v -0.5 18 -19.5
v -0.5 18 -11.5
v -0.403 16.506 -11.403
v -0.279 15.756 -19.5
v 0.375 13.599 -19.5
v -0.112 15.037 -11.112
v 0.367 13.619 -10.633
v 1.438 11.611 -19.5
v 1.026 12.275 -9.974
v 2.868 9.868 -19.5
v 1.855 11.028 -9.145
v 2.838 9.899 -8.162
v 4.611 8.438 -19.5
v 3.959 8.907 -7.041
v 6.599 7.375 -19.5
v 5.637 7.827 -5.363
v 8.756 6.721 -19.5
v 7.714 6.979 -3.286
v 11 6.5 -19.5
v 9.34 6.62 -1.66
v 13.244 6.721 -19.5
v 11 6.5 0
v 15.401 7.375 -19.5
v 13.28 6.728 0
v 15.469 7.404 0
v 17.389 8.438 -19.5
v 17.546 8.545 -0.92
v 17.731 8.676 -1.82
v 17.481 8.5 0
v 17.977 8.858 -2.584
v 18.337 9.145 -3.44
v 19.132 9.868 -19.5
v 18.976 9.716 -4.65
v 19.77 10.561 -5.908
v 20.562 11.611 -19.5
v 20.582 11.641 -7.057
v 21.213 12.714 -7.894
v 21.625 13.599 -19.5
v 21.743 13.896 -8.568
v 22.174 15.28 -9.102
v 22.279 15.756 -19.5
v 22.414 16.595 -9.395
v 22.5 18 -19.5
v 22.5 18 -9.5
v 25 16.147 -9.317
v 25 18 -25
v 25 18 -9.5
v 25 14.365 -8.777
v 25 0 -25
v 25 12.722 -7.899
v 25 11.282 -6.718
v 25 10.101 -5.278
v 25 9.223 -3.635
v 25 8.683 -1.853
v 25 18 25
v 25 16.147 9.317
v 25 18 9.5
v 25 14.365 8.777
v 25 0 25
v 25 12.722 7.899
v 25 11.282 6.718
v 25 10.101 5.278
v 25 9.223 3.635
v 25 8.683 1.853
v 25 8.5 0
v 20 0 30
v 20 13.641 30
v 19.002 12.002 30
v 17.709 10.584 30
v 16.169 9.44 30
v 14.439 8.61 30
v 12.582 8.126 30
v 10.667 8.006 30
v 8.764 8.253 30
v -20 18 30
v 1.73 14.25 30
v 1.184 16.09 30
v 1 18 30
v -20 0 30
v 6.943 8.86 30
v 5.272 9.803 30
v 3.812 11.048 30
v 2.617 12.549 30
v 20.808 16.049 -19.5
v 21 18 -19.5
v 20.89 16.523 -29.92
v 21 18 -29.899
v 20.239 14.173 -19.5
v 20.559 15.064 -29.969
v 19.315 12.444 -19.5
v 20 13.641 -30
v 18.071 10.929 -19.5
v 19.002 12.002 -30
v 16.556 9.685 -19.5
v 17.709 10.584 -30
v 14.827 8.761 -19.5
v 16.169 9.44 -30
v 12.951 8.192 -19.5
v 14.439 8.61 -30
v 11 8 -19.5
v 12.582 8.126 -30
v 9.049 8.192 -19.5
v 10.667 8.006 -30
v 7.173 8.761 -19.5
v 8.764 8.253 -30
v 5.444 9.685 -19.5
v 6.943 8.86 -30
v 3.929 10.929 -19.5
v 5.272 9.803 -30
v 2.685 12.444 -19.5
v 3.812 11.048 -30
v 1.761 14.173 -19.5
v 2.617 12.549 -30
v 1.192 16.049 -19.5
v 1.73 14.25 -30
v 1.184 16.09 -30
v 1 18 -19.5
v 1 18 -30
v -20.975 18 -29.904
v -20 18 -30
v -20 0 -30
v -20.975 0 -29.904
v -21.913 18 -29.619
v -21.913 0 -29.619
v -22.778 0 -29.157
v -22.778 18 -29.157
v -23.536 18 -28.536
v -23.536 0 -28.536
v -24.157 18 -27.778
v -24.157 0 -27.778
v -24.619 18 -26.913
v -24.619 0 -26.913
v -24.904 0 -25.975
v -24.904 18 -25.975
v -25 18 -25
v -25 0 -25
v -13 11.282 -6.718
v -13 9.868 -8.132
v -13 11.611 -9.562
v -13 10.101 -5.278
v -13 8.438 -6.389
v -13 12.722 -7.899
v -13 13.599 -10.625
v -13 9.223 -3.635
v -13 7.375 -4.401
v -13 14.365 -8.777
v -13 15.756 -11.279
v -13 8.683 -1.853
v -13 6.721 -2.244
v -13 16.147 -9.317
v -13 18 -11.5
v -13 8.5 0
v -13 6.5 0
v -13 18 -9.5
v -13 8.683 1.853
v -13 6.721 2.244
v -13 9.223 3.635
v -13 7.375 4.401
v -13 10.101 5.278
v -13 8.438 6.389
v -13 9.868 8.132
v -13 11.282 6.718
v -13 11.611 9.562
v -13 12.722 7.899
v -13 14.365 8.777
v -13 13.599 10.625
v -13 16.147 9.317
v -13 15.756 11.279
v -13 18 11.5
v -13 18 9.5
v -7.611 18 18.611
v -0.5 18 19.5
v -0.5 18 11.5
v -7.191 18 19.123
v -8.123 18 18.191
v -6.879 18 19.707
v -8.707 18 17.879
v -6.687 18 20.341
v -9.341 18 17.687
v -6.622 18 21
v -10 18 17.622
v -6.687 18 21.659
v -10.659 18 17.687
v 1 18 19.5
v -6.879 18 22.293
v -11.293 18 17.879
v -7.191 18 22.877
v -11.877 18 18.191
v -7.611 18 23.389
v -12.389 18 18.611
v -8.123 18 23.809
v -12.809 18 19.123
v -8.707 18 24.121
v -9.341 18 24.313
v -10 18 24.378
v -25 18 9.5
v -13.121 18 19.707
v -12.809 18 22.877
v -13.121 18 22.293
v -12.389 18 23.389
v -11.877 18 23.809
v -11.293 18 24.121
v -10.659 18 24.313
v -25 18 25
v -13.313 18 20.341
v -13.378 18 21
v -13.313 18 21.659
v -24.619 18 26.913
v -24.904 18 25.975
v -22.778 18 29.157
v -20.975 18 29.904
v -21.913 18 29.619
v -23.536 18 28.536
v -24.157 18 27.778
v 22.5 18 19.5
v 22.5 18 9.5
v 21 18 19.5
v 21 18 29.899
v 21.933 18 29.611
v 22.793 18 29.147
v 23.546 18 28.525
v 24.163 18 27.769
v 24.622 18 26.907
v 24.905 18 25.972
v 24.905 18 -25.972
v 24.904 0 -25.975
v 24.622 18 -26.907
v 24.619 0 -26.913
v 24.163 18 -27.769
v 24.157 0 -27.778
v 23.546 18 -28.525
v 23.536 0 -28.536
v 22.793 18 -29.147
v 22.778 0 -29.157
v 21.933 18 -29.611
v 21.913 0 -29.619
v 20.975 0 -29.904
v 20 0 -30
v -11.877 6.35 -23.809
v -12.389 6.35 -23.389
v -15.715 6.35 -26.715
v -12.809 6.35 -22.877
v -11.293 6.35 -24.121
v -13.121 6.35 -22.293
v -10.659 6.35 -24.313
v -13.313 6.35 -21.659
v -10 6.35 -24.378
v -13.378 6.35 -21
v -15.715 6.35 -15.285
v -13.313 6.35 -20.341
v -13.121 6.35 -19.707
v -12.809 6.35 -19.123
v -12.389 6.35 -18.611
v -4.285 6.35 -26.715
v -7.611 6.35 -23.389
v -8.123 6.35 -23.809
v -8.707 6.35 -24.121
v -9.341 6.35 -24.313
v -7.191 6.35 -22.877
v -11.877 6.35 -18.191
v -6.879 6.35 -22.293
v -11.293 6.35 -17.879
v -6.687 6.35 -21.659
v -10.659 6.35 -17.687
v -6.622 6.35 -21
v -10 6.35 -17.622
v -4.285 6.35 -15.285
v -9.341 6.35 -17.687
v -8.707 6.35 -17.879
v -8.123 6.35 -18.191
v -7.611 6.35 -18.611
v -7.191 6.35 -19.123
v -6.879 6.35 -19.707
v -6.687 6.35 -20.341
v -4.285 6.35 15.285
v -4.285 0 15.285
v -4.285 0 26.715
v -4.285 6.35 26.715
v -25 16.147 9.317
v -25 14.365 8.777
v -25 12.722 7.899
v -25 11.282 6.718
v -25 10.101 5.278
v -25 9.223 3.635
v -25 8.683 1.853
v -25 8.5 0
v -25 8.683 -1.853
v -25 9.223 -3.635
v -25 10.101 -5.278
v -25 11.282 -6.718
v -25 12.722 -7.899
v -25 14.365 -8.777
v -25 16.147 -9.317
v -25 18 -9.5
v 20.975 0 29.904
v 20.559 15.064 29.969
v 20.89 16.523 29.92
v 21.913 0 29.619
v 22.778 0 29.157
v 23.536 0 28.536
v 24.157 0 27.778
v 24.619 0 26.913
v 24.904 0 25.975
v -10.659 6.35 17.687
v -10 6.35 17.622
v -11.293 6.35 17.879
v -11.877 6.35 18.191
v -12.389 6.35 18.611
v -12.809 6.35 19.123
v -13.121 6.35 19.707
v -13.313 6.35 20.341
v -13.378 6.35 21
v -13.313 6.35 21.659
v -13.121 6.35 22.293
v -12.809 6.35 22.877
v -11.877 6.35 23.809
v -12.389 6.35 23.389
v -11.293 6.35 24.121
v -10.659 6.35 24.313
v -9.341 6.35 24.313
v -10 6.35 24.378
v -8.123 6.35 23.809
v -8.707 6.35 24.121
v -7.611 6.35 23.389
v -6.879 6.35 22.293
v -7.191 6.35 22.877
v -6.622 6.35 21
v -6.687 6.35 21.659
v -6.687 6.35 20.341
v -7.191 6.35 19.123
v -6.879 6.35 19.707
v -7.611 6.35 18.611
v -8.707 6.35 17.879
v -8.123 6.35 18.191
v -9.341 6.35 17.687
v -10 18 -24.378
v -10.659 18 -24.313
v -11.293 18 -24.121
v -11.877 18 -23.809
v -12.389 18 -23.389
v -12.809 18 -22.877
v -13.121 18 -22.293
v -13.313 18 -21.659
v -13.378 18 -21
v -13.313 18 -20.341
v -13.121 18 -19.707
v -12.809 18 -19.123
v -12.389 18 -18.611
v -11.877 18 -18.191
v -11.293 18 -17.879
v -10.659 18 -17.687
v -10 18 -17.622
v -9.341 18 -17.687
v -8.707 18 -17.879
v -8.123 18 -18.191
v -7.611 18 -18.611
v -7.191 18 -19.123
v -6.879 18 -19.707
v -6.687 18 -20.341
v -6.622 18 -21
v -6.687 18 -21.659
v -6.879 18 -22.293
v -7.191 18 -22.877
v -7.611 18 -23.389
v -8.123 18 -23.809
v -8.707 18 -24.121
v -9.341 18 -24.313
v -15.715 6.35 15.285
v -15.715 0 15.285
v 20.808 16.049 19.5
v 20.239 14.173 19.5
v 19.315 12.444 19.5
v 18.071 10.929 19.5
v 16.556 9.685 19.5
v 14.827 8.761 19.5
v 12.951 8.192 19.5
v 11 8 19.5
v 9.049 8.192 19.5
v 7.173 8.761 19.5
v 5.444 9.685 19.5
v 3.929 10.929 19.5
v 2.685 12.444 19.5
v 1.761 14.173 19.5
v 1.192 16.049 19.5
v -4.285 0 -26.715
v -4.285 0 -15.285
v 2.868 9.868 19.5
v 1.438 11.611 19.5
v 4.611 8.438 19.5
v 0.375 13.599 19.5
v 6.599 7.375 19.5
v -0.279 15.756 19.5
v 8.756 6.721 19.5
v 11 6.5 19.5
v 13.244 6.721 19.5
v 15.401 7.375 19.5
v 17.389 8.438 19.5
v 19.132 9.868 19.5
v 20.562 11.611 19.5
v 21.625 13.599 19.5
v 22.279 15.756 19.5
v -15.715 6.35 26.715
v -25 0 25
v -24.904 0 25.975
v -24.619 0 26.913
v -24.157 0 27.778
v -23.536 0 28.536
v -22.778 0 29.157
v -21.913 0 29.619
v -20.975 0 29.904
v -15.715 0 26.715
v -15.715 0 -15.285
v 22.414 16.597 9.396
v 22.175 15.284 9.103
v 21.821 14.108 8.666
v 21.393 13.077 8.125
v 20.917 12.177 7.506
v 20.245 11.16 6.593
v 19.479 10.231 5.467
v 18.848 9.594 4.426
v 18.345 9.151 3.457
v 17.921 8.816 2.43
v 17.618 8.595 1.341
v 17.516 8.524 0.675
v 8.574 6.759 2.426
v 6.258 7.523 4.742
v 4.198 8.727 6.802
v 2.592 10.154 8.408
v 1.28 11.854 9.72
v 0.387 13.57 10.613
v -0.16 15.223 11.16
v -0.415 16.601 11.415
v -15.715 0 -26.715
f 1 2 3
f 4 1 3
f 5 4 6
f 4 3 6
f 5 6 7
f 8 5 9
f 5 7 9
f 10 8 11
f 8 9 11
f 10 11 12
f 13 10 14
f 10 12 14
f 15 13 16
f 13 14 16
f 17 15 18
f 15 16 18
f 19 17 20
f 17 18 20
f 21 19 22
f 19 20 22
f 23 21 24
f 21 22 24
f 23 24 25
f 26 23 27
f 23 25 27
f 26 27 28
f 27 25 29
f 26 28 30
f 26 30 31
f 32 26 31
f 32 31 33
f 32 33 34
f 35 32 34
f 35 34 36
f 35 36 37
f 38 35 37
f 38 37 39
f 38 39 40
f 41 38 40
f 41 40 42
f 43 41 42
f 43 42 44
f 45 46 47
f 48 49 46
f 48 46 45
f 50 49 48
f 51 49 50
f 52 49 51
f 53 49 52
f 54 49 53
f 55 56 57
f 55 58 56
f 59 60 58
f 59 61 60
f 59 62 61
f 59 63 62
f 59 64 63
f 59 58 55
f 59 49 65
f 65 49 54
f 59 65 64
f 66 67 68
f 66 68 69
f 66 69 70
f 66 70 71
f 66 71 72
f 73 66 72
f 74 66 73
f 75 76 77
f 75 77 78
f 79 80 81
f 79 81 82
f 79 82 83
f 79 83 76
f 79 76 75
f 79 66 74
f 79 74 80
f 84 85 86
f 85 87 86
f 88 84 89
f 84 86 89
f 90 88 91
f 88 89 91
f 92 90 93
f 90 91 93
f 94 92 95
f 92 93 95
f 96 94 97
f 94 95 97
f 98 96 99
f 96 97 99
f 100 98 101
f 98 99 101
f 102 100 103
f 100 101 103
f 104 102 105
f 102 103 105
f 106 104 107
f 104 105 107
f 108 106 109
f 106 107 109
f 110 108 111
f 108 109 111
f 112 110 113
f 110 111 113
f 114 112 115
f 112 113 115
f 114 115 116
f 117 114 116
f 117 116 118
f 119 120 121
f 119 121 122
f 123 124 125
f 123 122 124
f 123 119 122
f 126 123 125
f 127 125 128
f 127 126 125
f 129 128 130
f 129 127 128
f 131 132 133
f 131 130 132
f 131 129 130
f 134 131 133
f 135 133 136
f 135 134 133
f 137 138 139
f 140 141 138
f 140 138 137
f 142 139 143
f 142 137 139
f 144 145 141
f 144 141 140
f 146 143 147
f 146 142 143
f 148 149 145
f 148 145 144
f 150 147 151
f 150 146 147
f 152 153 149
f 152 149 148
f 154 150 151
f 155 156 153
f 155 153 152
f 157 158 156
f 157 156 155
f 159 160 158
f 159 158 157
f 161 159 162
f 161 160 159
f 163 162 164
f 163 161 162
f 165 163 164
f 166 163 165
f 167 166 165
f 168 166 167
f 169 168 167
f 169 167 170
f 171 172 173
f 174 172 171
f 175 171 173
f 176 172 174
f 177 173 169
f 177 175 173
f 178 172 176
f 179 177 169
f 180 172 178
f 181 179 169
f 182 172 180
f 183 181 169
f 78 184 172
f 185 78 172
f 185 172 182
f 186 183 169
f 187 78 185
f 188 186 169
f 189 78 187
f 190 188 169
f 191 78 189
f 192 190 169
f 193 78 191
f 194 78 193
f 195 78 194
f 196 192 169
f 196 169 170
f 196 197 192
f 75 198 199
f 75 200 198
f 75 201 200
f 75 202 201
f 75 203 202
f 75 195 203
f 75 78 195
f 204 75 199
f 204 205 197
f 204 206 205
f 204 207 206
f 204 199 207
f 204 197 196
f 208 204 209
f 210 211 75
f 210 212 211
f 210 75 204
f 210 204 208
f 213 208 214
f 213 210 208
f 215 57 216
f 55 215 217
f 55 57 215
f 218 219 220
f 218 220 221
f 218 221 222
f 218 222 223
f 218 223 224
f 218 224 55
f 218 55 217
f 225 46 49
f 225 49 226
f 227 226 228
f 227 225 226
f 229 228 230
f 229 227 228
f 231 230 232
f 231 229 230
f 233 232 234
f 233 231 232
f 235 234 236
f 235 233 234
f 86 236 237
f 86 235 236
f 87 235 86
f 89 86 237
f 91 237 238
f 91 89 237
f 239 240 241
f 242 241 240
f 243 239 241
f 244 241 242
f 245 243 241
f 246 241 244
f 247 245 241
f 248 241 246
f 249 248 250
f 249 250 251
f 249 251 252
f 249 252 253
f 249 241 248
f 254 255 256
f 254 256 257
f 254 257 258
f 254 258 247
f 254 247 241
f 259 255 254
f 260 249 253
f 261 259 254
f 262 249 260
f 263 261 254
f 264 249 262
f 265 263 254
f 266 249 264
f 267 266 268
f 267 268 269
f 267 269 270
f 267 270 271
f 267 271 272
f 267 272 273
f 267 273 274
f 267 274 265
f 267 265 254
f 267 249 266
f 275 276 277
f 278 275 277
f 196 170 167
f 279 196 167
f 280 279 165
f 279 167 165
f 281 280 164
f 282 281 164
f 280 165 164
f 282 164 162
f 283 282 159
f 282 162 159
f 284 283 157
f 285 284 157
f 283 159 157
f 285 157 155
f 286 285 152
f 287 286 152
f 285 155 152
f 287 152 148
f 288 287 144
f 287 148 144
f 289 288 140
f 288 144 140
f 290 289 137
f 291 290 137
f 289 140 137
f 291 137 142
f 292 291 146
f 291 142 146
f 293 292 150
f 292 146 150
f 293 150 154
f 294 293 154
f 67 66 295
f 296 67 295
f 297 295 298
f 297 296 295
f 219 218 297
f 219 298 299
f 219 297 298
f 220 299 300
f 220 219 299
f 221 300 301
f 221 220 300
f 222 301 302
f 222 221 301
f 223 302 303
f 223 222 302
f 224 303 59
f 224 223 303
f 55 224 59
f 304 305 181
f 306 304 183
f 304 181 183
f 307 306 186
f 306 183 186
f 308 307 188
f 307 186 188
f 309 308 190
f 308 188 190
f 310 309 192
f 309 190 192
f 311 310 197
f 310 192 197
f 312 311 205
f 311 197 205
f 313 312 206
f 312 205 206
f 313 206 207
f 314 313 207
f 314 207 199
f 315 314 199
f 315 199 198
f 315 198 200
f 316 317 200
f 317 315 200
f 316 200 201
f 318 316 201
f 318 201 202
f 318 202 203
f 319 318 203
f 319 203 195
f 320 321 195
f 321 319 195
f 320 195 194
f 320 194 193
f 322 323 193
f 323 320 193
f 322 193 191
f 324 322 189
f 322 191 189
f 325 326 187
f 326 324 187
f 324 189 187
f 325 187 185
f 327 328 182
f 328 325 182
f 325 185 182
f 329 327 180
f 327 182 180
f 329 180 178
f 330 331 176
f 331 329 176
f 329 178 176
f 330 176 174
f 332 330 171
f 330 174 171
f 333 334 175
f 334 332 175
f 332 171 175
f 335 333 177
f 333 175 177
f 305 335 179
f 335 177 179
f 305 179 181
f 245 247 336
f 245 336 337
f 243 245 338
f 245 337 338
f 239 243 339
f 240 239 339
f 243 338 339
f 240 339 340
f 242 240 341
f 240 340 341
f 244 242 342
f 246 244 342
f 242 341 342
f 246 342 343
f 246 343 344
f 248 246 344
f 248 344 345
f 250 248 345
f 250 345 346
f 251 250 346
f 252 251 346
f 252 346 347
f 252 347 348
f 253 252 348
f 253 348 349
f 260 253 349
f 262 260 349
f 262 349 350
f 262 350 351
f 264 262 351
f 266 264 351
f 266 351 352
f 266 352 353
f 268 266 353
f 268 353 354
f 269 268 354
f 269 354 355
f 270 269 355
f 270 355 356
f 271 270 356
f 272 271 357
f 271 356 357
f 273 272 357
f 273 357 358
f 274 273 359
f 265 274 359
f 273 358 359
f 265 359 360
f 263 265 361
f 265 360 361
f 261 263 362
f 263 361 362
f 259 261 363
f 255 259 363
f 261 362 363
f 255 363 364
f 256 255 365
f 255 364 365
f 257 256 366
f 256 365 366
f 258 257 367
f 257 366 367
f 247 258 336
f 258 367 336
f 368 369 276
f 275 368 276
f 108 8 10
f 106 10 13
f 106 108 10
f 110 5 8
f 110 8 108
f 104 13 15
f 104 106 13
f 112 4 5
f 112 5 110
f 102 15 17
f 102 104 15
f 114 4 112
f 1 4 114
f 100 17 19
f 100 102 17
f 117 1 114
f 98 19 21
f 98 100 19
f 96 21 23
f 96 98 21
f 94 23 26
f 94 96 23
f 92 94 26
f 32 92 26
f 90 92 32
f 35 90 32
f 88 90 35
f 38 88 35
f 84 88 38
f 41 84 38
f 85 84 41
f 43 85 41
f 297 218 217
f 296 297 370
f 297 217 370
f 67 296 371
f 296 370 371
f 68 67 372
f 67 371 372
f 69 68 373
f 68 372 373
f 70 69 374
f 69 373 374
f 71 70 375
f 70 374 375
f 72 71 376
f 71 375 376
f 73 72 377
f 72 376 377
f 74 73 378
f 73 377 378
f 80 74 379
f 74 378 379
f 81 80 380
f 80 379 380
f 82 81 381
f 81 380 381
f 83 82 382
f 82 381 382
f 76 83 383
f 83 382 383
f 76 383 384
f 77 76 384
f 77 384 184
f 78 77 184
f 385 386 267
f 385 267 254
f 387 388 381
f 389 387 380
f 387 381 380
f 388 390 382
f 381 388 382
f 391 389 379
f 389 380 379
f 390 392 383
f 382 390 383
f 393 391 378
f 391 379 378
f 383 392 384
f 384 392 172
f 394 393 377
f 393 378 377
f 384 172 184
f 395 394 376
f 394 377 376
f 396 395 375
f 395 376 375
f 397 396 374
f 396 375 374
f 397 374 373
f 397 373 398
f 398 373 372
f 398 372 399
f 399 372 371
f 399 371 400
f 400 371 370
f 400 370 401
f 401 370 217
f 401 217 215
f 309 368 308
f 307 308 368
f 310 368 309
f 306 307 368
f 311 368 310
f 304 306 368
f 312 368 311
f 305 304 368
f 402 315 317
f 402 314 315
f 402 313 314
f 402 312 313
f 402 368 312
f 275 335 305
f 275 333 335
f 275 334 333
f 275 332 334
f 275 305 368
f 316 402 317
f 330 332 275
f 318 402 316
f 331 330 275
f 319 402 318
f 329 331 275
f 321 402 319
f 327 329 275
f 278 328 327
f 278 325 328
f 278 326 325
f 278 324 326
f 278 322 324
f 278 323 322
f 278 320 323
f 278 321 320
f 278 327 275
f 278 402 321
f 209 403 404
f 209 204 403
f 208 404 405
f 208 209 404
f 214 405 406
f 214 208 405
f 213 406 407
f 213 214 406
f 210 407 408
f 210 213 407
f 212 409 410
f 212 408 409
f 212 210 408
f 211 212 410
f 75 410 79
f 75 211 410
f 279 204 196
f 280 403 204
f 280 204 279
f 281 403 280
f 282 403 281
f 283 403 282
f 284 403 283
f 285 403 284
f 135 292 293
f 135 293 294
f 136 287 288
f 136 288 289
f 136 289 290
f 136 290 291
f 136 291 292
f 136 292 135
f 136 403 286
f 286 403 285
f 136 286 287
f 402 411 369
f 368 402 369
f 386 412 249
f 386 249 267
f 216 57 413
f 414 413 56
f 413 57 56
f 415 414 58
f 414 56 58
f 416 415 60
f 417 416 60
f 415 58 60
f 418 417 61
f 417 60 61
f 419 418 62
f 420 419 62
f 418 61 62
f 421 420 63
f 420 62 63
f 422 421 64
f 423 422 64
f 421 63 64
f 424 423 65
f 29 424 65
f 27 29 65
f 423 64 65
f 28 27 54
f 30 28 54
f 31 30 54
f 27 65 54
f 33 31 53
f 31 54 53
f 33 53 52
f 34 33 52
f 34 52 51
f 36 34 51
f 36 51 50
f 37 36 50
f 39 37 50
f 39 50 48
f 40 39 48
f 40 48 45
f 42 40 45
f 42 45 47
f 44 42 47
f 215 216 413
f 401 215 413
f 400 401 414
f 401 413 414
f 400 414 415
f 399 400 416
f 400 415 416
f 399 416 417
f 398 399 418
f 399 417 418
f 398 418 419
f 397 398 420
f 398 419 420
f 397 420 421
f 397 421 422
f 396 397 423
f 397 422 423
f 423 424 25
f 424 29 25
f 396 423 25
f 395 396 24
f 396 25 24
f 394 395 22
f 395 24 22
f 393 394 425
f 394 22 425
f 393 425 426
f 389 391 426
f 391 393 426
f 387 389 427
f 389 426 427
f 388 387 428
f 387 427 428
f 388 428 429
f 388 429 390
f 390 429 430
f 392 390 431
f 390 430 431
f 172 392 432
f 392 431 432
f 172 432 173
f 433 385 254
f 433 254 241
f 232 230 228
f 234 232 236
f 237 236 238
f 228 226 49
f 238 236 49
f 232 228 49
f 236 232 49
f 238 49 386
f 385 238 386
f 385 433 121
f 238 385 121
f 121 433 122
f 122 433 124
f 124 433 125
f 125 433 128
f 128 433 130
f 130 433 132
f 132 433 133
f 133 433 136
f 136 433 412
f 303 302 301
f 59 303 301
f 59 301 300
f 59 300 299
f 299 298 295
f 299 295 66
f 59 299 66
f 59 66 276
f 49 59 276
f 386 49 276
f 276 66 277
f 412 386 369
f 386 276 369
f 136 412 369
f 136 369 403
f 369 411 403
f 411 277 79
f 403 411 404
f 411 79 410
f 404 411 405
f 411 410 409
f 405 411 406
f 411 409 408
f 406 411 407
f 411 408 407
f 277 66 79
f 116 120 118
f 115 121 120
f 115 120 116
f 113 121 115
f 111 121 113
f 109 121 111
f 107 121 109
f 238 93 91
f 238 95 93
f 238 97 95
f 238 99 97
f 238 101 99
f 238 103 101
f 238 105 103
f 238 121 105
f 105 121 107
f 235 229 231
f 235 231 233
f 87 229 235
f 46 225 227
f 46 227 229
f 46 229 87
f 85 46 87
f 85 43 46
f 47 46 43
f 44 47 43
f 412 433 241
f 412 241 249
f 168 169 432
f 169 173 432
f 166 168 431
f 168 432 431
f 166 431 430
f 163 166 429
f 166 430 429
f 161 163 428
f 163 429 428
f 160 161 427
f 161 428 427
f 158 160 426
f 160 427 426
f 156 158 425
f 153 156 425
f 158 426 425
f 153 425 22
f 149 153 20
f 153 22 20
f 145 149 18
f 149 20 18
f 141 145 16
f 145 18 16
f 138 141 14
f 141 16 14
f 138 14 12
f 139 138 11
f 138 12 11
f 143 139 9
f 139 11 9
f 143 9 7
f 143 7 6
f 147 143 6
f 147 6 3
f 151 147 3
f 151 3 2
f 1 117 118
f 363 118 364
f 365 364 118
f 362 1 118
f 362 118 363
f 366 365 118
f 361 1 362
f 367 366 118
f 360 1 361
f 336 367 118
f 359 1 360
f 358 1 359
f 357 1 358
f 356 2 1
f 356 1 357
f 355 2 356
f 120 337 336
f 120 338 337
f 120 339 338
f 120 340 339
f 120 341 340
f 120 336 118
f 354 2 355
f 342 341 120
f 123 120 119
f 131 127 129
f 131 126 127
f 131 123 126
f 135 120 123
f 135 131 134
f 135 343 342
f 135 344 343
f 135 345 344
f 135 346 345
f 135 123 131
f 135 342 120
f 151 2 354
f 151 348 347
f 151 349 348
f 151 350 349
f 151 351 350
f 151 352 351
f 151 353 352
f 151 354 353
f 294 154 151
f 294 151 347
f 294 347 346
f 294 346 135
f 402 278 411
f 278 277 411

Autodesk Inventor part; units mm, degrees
ref_plane "XZ Plane" through (0, 0, 0) normal (0, 1, 0) x (-1, 0, 0)
ref_plane "XY Plane" through (0, 0, 0) normal (0, 0, 1) x (1, 0, 0)
sketch "Sketch1" plane through (0, 0, 0) normal (0, 1, 0) x (-1, 0, 0)
  line L0 (-25, 30) -> (25, 30)
  line L1 (25, 30) -> (25, -30)
  line L2 (25, -30) -> (-25, -30)
  line L3 (-25, -30) -> (-25, 30)
  line L4 (-25, 30) -> (25, -30) construction
  line L5 (25, 30) -> (-25, -30) construction
  point P0 (0, 0)
  dimension "d0" = 50
  dimension "d1" = 60
extrude "Extrusion1" add sketch "Sketch1" along normal blind 18
sketch "Sketch2" plane through (25, 0, 30) normal (1, 0, 0) x (0, 0, -1)
  line L0 (60, 18) -> (0, 18) projected
  circle A0 centre (30, 18) radius 9.5
  point P0 (30, 0)
  point P1 (20.5, 18)
  point P2 (39.5, 18)
  dimension "d4" = 19
extrude "Extrusion2" cut sketch "Sketch2" against normal through all contours A0 L0 picked at (28.8771, 15.0391)
sketch "Sketch3" plane through (25, 0, -30) normal (0, 0, -1) x (-1, 0, 0)
  line L0 (0, 18) -> (50, 18) projected
  circle A0 centre (14, 18) radius 10
  point P0 (25, 0)
  point P1 (24, 18)
  point P2 (4, 18)
  dimension "d7" = 20
  dimension "d8" = 14
extrude "Extrusion3" cut sketch "Sketch3" against normal through all contours L0 A0 picked at (12.1065, 15.2567)
sketch "Sketch4" plane through (0, 0, 0) normal (0, 0, 1) x (1, 0, 0)
  arc A0 (1, 18) -> (21, 18) centre (11, 18) ccw projected
  circle A1 centre (11, 18) radius 11.5
  point P0 (0, 0)
  dimension "d11" = 23
extrude "Extrusion4" cut sketch "Sketch4" along normal mid plane 39
ref_plane "Work Plane2" through (11, 18, -30) normal (1, 0, 0) x (0, 1, 0)
sketch "Sketch5" plane through (11, 18, -30) normal (1, 0, 0) x (0, 1, 0)
  arc A0 (0, 39.5) -> (0, 20.5) centre (0, 30) ccw projected
  circle A1 centre (0, 30) radius 11.5
  point P0 (-18, 30)
  dimension "d14" = 23
extrude "Extrusion5" cut sketch "Sketch5" against normal blind 24
sketch "Sketch7" plane through (0, 0, 0) normal (0, -1, 0) x (1, 0, 0)
  line L0 (25, -30) -> (-25, -30) projected
  line L1 (-25, 30) -> (25, 30) projected
  line L2 (-25, -30) -> (-25, 30) projected
  point P0 (0, 0)
  point P1 (-10, -21)
  point P2 (-10, 21)
  dimension "d28" = 9
  dimension "d29" = 9
  dimension "d30" = 15
hole "Hole2" at (-10, 0, -21) at (-10, 0, 21) direction (0, 1, 0) diameter 6.756 end through all clearance for "Socket Head Cap Screw" size "1/4" standard "Ansi Unified Screw Threads"
fillet "Fillet1" radius 5 4 edges at (-25, 9, -30) (-25, 9, 30) (25, 9, 30) (25, 9, -30)
sketch "Sketch8" plane through (0, 0, 0) normal (0, -1, 0) x (1, 0, 0)
  circle A0 centre (-10, -21) radius 3.378 projected
  circle A1 centre (-10, 21) radius 3.378 projected
  line L0 (-4.285, -26.715) -> (-15.715, -26.715)
  line L1 (-15.715, -26.715) -> (-15.715, -15.285)
  line L2 (-15.715, -15.285) -> (-4.285, -15.285)
  line L3 (-4.285, -15.285) -> (-4.285, -26.715)
  line L4 (-4.285, -26.715) -> (-15.715, -15.285) construction
  line L5 (-15.715, -26.715) -> (-4.285, -15.285) construction
  line L6 (-4.285, 26.715) -> (-15.715, 26.715)
  line L7 (-15.715, 26.715) -> (-15.715, 15.285)
  line L8 (-15.715, 15.285) -> (-4.285, 15.285)
  line L9 (-4.285, 15.285) -> (-4.285, 26.715)
  line L10 (-4.285, 26.715) -> (-15.715, 15.285) construction
  line L11 (-15.715, 26.715) -> (-4.285, 15.285) construction
  point P0 (0, 0)
  dimension "d39" = 11.43
  dimension "d40" = 11.43
  dimension "d41" = 11.43
  dimension "d42" = 11.43
extrude "Extrusion6" cut sketch "Sketch8" against normal blind 6.35
equation "\"d29\" = d28"
equation "\"d40\" = d39"
equation "\"d41\" = d39"
equation "\"d42\" = d40"
properties part number "Valve Block Top"
